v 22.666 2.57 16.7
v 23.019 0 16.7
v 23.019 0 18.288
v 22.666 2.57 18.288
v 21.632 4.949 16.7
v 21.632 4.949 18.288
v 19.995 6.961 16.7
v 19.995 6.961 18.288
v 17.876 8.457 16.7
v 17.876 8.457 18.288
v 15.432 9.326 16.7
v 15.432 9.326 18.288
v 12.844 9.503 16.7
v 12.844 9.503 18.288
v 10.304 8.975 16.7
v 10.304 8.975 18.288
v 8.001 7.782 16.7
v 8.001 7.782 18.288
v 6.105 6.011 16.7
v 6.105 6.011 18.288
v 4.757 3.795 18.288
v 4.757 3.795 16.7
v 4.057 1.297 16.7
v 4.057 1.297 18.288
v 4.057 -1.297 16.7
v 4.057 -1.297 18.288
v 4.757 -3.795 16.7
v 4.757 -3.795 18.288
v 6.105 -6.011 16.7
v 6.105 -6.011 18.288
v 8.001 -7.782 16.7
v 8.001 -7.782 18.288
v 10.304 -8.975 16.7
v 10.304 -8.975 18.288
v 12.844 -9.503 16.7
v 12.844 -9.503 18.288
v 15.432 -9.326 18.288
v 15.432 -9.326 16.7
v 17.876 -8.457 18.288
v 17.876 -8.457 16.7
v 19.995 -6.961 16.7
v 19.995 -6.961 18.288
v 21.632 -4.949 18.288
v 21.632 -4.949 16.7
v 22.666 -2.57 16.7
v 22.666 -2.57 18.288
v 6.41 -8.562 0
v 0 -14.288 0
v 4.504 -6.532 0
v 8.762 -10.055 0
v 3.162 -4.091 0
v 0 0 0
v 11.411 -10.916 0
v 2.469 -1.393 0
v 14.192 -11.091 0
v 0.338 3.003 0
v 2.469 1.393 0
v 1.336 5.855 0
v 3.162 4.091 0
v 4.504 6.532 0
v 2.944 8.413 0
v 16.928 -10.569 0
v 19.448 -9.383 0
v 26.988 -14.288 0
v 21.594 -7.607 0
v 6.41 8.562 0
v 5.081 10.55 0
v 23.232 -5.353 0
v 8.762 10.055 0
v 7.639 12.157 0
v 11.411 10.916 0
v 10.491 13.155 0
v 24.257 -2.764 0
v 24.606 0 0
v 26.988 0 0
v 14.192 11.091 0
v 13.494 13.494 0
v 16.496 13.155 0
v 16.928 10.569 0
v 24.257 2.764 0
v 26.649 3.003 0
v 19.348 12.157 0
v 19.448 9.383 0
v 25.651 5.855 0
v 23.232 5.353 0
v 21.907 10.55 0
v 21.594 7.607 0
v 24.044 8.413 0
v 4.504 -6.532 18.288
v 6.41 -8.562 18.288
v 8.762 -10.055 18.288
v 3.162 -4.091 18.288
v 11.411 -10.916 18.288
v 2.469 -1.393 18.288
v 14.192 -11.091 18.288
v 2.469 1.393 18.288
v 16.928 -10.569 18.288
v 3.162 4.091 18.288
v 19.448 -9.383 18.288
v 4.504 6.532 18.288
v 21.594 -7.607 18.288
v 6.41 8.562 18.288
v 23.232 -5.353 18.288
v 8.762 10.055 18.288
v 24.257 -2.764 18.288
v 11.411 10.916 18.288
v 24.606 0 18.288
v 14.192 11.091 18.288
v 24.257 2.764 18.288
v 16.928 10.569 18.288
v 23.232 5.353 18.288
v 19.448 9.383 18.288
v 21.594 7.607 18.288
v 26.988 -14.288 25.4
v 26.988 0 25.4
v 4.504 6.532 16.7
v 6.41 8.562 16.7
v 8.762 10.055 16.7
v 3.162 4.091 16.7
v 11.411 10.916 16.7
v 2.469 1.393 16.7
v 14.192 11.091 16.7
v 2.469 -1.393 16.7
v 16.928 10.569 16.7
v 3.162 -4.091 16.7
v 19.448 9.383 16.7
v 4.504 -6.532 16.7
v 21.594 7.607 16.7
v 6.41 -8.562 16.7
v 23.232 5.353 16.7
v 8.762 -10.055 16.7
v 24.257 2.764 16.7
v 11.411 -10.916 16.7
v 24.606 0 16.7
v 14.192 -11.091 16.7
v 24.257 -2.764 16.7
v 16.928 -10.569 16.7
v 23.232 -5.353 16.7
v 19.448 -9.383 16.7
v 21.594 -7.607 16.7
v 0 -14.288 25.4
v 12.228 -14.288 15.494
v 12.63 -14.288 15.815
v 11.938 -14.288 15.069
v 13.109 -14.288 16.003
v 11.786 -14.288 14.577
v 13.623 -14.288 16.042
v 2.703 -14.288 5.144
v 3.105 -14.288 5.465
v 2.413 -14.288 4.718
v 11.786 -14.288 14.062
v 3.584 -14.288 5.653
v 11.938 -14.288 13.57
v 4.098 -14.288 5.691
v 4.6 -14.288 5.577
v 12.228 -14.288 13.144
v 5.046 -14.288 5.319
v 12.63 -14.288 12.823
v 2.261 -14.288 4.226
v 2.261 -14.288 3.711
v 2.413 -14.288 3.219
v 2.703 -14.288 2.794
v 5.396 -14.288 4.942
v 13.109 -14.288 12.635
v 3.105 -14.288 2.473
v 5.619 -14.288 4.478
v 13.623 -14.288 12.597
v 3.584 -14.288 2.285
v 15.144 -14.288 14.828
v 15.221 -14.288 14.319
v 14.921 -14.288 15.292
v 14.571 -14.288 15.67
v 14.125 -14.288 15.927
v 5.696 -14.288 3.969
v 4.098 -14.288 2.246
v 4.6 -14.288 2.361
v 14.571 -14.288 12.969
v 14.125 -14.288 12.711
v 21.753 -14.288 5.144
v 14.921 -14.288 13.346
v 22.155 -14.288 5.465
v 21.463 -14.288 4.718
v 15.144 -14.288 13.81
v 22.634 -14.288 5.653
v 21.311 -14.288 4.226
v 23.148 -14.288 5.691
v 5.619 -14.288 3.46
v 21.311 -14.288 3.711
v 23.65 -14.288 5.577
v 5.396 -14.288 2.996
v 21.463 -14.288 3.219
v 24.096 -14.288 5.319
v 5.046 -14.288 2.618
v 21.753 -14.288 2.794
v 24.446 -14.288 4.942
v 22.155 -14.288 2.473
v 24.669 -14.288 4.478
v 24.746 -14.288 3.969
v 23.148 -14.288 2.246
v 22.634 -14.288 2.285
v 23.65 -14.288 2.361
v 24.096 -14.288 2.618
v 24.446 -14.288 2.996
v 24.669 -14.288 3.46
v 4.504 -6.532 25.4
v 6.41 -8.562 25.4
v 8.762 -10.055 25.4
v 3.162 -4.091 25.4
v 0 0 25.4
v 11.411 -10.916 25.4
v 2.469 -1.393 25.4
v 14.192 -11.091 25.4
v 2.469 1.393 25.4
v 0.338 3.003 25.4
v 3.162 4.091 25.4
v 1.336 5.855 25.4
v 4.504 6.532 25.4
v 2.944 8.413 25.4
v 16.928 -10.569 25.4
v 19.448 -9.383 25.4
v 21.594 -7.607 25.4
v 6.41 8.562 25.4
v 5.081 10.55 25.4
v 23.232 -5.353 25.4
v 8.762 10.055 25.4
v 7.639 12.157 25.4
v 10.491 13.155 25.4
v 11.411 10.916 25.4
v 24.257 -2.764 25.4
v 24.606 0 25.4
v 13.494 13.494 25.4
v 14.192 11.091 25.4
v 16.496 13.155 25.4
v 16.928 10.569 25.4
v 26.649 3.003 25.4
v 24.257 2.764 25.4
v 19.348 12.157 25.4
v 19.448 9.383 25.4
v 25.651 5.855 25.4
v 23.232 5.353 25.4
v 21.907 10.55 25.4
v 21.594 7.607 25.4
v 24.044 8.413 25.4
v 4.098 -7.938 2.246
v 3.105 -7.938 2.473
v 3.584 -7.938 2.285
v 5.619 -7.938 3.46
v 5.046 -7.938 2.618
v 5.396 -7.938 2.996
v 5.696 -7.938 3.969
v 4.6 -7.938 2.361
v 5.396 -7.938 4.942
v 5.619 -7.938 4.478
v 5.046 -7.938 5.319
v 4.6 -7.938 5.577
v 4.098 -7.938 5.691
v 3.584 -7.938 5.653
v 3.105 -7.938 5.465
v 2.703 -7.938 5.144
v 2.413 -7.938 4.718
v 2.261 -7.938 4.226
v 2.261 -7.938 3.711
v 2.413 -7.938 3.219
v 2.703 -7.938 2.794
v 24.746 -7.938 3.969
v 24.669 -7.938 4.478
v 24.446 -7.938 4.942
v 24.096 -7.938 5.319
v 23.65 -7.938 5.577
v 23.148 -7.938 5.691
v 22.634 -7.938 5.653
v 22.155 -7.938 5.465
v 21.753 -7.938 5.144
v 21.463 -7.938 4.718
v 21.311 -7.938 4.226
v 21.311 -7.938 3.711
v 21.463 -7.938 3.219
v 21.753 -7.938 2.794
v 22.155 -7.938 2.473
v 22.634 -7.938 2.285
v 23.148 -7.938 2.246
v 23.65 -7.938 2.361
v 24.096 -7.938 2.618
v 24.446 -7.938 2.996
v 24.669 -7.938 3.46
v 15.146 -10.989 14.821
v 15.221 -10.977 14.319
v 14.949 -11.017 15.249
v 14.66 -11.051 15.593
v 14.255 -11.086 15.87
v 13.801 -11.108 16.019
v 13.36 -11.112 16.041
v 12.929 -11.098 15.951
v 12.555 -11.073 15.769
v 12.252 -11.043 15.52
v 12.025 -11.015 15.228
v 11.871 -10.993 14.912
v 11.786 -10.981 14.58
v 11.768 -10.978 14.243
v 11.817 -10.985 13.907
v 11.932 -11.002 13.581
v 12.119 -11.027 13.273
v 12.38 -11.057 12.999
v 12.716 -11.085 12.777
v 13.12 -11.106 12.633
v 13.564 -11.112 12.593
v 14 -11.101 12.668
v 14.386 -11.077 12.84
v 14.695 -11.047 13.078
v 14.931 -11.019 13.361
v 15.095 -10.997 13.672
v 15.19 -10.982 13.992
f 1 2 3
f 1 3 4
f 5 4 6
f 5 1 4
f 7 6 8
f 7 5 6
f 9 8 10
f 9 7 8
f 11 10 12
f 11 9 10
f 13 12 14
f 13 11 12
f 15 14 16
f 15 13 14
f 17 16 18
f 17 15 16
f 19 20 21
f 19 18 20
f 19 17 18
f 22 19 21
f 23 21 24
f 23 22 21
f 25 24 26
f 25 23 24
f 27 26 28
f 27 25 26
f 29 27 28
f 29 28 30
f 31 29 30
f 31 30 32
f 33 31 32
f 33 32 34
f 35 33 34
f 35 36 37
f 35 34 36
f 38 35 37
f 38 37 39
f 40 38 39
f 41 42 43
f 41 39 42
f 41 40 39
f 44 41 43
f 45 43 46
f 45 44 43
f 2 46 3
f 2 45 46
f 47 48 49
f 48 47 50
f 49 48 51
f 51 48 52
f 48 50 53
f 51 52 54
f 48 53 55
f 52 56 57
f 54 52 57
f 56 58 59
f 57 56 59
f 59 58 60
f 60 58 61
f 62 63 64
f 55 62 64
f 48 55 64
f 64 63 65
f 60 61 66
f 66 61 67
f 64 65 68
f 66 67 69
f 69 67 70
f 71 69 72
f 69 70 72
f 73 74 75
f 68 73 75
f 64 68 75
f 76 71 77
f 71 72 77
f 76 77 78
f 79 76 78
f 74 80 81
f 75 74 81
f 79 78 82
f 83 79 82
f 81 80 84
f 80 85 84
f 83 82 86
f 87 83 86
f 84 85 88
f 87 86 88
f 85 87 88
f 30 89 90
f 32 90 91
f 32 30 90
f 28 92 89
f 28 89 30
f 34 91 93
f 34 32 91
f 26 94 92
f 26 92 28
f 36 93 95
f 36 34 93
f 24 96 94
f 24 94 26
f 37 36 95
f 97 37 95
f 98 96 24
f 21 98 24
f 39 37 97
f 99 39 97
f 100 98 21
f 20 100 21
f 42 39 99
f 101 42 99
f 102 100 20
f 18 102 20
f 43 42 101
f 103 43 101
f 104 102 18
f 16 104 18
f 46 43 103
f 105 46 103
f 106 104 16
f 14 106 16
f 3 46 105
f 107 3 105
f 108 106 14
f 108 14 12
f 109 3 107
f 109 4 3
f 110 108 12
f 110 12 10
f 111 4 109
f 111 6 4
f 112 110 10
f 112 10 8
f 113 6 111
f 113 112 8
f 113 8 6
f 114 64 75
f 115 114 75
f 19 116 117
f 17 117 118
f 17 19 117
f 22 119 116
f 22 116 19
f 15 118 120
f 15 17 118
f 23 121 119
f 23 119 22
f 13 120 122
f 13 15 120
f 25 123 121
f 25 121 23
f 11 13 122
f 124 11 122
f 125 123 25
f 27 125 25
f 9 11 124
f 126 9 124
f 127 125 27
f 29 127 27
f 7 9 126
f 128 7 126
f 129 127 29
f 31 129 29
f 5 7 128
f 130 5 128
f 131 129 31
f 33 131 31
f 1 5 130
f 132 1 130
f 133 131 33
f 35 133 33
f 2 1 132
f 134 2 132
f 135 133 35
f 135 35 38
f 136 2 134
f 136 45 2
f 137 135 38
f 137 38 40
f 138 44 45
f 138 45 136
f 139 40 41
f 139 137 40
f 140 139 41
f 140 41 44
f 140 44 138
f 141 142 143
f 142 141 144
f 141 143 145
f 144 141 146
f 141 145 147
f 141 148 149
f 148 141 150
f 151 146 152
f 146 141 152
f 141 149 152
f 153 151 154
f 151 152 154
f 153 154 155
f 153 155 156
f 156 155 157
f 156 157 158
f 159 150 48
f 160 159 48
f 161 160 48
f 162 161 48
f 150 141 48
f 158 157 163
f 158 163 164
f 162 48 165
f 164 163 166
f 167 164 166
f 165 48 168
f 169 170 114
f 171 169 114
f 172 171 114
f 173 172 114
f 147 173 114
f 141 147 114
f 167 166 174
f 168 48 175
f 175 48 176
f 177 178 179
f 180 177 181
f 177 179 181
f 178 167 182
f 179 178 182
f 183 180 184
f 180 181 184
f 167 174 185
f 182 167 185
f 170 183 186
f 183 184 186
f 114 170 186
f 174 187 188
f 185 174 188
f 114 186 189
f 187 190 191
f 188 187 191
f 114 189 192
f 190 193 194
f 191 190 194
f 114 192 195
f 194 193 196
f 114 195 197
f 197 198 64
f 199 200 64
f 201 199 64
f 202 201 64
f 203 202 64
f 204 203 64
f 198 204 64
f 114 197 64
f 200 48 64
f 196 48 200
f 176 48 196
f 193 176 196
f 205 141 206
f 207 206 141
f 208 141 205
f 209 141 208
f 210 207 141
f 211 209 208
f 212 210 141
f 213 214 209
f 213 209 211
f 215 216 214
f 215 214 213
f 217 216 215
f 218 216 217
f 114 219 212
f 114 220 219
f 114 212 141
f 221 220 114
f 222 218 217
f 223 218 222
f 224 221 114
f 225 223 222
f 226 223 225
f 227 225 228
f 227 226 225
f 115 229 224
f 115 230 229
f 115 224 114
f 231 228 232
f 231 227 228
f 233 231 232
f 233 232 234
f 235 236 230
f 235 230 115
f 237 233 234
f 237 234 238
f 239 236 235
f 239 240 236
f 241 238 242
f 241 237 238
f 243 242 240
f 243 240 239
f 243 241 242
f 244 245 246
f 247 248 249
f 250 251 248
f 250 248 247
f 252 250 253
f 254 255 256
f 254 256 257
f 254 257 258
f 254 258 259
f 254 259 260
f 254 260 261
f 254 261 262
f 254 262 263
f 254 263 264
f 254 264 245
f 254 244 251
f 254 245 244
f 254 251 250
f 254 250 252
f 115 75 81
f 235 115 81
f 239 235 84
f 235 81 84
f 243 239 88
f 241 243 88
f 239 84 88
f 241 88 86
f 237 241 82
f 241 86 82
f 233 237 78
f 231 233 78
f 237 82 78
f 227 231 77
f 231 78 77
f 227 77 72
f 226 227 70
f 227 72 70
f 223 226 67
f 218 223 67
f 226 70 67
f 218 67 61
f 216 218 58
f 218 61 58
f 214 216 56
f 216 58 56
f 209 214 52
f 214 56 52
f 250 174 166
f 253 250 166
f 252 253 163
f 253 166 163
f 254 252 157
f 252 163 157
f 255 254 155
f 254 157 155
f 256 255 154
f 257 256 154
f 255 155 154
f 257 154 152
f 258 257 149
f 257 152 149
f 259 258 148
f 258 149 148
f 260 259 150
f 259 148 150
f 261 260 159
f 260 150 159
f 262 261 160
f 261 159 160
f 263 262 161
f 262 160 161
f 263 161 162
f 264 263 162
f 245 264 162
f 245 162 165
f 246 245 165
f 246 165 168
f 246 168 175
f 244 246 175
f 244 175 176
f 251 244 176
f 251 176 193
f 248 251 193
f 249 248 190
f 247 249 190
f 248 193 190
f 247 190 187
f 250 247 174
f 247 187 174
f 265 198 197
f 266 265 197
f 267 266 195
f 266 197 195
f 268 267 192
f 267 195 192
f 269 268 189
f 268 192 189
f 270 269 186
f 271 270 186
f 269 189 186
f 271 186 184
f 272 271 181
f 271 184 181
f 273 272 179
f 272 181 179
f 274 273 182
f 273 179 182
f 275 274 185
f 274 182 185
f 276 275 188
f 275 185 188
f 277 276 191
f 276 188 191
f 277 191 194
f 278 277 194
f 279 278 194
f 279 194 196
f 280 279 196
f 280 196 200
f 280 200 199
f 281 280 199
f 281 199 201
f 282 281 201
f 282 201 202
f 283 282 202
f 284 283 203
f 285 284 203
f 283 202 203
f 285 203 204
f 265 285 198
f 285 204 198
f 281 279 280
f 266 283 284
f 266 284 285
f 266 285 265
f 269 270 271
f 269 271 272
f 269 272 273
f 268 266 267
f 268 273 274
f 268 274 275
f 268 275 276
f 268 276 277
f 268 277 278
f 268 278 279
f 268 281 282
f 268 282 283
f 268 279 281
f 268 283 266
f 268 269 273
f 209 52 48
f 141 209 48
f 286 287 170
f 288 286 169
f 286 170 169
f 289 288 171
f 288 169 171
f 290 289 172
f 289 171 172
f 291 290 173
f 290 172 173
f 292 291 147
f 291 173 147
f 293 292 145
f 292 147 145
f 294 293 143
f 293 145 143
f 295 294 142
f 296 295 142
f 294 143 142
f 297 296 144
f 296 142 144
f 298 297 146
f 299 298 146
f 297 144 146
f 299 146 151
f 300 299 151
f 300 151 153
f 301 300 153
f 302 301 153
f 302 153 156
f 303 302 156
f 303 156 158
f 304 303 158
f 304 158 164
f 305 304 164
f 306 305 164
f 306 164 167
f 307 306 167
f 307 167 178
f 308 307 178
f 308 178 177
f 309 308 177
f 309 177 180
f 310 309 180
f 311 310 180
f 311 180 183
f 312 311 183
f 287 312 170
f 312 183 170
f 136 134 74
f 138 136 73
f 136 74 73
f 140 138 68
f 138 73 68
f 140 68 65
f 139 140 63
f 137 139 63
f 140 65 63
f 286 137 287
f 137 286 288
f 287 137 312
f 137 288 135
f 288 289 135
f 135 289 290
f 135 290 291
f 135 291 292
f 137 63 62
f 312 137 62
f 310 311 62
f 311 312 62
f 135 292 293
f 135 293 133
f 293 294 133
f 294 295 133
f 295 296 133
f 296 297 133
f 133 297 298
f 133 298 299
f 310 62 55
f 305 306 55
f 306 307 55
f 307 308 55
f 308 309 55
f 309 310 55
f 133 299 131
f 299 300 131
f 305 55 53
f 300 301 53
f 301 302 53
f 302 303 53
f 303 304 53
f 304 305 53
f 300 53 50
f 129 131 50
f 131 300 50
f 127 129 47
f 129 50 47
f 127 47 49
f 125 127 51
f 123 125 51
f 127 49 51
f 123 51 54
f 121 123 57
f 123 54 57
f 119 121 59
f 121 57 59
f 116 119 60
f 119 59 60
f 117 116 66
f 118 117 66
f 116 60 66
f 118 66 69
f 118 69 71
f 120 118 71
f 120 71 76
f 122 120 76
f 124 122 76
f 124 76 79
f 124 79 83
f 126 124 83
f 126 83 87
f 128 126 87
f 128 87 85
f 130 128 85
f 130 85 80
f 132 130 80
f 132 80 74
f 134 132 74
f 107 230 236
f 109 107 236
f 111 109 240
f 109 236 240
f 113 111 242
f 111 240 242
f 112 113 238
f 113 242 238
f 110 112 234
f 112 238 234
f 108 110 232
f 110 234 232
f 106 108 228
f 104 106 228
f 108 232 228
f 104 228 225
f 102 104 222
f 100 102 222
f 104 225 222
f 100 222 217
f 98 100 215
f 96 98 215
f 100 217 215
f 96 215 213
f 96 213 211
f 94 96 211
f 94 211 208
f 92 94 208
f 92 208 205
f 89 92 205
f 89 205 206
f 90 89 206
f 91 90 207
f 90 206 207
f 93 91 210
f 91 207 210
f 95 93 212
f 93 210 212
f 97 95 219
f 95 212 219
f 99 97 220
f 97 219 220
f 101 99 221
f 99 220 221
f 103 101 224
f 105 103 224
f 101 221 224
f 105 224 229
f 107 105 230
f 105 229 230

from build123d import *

# Parameters (mm, degrees)
F0_R     = 9.525
F1_DEPTH = 25.4
F2_R     = 11.1125
F3_DEPTH = 7.112
F5_R     = 11.1125
F6_DEPTH = 16.7005
F7_R     = 1.7272
F8_DEPTH = 6.35


with BuildPart() as f1:
    # F0 (on Top) → F1 (new body)
    with BuildSketch(Plane.XY):
        with BuildLine():
            Line((0, 0), (0, -14.2875))
            Line((0, -14.2875), (26.9875, -14.2875))
            Line((26.9875, -14.2875), (26.9875, 0))
            ThreePointArc((26.9875, 0), (13.49375, 13.49375), (0, 0))
        make_face()
        with Locations((13.49375, 0)):
            Circle(F0_R, mode=Mode.SUBTRACT)
    extrude(amount=F1_DEPTH)

    # F2 (on face) → F3 (cut)
    with BuildSketch(Plane.XY.offset(25.4)):
        with Locations((13.49375, 0)):
            Circle(F2_R)
    extrude(amount=-F3_DEPTH, mode=Mode.SUBTRACT)

    # F5 (on face) → F6 (cut, through all)
    with BuildSketch(Plane(origin=(0, 0, 0), x_dir=(1, 0, 0), z_dir=(0, 0, -1))):
        with Locations((13.49375, 0)):
            Circle(F5_R)
    extrude(amount=-F6_DEPTH, mode=Mode.SUBTRACT)

    # F7 (on face) → F8 (cut)
    with BuildSketch(Plane.XZ.offset(14.2875)):
        with Locations((23.01875, 3.96875)):
            Circle(F7_R)
        with Locations((3.96875, 3.96875)):
            Circle(F7_R)
        with Locations((13.49375, 14.31925)):
            Circle(F7_R)
    extrude(amount=-F8_DEPTH, mode=Mode.SUBTRACT)


solid = f1.part
